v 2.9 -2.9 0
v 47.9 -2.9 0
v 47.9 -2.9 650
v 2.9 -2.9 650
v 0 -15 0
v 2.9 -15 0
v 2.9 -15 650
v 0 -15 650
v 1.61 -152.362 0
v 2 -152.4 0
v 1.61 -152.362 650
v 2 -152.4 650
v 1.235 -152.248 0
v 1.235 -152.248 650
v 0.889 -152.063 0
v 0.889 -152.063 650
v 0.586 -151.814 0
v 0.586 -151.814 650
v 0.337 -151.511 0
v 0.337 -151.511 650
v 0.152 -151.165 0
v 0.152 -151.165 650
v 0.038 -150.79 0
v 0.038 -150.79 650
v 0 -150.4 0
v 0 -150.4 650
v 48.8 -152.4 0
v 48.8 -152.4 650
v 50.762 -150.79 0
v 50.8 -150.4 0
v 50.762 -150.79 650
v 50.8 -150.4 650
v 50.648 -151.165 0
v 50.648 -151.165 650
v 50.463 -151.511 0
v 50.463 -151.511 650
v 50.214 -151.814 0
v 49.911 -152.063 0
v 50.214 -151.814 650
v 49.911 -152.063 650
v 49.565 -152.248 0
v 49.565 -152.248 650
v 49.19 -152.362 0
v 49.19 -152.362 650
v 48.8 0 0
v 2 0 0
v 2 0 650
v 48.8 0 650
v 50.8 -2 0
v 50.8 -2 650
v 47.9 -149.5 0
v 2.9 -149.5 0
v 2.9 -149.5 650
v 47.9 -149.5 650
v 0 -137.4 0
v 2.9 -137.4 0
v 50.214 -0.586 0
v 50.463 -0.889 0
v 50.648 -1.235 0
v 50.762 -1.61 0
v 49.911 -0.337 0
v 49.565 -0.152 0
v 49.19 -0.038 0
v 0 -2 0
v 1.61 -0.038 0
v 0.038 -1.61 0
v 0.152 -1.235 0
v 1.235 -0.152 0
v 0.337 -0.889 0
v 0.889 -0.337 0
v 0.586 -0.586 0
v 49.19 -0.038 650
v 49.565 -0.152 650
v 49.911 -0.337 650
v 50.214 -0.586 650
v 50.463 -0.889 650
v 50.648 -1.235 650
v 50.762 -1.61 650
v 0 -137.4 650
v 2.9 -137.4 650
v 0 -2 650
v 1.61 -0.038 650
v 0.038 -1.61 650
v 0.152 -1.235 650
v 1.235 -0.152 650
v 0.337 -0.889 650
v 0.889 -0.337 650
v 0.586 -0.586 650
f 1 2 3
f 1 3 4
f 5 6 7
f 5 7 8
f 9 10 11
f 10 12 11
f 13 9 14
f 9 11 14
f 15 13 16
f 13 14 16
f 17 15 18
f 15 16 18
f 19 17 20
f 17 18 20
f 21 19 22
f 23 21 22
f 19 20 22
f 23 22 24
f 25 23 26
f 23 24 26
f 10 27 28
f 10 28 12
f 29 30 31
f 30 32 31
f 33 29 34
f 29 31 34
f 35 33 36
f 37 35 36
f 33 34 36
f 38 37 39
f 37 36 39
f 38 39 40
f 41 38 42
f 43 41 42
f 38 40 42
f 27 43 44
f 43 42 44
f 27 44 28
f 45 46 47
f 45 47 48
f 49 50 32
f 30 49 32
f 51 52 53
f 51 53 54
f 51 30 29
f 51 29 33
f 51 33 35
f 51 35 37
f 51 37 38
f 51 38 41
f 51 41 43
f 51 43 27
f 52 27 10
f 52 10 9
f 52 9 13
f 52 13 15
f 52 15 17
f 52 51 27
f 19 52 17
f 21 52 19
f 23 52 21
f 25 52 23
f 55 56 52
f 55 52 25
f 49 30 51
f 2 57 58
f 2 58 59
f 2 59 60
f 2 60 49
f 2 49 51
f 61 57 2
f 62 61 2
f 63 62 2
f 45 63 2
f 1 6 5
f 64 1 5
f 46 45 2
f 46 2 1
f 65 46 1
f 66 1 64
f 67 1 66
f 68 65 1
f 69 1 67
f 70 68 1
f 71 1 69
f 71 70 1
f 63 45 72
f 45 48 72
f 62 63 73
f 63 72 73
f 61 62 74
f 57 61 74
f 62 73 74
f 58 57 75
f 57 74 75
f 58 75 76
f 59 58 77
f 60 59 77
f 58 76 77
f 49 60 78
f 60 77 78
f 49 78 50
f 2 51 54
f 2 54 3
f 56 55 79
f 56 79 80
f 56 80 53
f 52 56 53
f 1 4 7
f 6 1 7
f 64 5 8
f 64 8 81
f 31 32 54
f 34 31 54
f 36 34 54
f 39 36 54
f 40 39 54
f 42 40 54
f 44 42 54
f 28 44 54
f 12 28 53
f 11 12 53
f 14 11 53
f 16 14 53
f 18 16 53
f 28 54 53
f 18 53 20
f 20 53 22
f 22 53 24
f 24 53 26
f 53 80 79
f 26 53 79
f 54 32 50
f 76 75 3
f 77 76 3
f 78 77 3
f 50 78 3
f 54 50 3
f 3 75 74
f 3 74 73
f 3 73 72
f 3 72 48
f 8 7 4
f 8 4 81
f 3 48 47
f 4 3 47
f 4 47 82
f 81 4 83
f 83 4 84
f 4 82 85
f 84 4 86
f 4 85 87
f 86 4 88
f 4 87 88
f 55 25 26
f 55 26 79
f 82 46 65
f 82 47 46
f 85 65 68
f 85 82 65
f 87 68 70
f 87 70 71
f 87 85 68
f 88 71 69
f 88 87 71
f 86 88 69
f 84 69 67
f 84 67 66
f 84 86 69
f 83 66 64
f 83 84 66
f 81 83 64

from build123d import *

# Parameters (mm, degrees)
SALIENTE_EXTRUIR1_DEPTH = 650
REDONDEO1_R             = 2


with BuildPart() as part:
    # Croquis1 → Saliente-Extruir1 (new body)
    with BuildSketch(Plane.XY):
        Polygon((0, 0), (50.8, 0), (50.8, -152.4), (0, -152.4), (0, -137.4), (2.9, -137.4), (2.9, -149.5), (47.9, -149.5), (47.9, -2.9), (2.9, -2.9), (2.9, -15), (0, -15), align=None)
    extrude(amount=SALIENTE_EXTRUIR1_DEPTH)

    # Redondeo1
    redondeo1_edges = [part.edges().sort_by_distance(p)[0] for p in [
        (0, 0, 325),
        (50.8, 0, 325),
        (50.8, -152.4, 325),
        (0, -152.4, 325),
    ]]
    fillet(redondeo1_edges, radius=REDONDEO1_R)


solid = part.part
